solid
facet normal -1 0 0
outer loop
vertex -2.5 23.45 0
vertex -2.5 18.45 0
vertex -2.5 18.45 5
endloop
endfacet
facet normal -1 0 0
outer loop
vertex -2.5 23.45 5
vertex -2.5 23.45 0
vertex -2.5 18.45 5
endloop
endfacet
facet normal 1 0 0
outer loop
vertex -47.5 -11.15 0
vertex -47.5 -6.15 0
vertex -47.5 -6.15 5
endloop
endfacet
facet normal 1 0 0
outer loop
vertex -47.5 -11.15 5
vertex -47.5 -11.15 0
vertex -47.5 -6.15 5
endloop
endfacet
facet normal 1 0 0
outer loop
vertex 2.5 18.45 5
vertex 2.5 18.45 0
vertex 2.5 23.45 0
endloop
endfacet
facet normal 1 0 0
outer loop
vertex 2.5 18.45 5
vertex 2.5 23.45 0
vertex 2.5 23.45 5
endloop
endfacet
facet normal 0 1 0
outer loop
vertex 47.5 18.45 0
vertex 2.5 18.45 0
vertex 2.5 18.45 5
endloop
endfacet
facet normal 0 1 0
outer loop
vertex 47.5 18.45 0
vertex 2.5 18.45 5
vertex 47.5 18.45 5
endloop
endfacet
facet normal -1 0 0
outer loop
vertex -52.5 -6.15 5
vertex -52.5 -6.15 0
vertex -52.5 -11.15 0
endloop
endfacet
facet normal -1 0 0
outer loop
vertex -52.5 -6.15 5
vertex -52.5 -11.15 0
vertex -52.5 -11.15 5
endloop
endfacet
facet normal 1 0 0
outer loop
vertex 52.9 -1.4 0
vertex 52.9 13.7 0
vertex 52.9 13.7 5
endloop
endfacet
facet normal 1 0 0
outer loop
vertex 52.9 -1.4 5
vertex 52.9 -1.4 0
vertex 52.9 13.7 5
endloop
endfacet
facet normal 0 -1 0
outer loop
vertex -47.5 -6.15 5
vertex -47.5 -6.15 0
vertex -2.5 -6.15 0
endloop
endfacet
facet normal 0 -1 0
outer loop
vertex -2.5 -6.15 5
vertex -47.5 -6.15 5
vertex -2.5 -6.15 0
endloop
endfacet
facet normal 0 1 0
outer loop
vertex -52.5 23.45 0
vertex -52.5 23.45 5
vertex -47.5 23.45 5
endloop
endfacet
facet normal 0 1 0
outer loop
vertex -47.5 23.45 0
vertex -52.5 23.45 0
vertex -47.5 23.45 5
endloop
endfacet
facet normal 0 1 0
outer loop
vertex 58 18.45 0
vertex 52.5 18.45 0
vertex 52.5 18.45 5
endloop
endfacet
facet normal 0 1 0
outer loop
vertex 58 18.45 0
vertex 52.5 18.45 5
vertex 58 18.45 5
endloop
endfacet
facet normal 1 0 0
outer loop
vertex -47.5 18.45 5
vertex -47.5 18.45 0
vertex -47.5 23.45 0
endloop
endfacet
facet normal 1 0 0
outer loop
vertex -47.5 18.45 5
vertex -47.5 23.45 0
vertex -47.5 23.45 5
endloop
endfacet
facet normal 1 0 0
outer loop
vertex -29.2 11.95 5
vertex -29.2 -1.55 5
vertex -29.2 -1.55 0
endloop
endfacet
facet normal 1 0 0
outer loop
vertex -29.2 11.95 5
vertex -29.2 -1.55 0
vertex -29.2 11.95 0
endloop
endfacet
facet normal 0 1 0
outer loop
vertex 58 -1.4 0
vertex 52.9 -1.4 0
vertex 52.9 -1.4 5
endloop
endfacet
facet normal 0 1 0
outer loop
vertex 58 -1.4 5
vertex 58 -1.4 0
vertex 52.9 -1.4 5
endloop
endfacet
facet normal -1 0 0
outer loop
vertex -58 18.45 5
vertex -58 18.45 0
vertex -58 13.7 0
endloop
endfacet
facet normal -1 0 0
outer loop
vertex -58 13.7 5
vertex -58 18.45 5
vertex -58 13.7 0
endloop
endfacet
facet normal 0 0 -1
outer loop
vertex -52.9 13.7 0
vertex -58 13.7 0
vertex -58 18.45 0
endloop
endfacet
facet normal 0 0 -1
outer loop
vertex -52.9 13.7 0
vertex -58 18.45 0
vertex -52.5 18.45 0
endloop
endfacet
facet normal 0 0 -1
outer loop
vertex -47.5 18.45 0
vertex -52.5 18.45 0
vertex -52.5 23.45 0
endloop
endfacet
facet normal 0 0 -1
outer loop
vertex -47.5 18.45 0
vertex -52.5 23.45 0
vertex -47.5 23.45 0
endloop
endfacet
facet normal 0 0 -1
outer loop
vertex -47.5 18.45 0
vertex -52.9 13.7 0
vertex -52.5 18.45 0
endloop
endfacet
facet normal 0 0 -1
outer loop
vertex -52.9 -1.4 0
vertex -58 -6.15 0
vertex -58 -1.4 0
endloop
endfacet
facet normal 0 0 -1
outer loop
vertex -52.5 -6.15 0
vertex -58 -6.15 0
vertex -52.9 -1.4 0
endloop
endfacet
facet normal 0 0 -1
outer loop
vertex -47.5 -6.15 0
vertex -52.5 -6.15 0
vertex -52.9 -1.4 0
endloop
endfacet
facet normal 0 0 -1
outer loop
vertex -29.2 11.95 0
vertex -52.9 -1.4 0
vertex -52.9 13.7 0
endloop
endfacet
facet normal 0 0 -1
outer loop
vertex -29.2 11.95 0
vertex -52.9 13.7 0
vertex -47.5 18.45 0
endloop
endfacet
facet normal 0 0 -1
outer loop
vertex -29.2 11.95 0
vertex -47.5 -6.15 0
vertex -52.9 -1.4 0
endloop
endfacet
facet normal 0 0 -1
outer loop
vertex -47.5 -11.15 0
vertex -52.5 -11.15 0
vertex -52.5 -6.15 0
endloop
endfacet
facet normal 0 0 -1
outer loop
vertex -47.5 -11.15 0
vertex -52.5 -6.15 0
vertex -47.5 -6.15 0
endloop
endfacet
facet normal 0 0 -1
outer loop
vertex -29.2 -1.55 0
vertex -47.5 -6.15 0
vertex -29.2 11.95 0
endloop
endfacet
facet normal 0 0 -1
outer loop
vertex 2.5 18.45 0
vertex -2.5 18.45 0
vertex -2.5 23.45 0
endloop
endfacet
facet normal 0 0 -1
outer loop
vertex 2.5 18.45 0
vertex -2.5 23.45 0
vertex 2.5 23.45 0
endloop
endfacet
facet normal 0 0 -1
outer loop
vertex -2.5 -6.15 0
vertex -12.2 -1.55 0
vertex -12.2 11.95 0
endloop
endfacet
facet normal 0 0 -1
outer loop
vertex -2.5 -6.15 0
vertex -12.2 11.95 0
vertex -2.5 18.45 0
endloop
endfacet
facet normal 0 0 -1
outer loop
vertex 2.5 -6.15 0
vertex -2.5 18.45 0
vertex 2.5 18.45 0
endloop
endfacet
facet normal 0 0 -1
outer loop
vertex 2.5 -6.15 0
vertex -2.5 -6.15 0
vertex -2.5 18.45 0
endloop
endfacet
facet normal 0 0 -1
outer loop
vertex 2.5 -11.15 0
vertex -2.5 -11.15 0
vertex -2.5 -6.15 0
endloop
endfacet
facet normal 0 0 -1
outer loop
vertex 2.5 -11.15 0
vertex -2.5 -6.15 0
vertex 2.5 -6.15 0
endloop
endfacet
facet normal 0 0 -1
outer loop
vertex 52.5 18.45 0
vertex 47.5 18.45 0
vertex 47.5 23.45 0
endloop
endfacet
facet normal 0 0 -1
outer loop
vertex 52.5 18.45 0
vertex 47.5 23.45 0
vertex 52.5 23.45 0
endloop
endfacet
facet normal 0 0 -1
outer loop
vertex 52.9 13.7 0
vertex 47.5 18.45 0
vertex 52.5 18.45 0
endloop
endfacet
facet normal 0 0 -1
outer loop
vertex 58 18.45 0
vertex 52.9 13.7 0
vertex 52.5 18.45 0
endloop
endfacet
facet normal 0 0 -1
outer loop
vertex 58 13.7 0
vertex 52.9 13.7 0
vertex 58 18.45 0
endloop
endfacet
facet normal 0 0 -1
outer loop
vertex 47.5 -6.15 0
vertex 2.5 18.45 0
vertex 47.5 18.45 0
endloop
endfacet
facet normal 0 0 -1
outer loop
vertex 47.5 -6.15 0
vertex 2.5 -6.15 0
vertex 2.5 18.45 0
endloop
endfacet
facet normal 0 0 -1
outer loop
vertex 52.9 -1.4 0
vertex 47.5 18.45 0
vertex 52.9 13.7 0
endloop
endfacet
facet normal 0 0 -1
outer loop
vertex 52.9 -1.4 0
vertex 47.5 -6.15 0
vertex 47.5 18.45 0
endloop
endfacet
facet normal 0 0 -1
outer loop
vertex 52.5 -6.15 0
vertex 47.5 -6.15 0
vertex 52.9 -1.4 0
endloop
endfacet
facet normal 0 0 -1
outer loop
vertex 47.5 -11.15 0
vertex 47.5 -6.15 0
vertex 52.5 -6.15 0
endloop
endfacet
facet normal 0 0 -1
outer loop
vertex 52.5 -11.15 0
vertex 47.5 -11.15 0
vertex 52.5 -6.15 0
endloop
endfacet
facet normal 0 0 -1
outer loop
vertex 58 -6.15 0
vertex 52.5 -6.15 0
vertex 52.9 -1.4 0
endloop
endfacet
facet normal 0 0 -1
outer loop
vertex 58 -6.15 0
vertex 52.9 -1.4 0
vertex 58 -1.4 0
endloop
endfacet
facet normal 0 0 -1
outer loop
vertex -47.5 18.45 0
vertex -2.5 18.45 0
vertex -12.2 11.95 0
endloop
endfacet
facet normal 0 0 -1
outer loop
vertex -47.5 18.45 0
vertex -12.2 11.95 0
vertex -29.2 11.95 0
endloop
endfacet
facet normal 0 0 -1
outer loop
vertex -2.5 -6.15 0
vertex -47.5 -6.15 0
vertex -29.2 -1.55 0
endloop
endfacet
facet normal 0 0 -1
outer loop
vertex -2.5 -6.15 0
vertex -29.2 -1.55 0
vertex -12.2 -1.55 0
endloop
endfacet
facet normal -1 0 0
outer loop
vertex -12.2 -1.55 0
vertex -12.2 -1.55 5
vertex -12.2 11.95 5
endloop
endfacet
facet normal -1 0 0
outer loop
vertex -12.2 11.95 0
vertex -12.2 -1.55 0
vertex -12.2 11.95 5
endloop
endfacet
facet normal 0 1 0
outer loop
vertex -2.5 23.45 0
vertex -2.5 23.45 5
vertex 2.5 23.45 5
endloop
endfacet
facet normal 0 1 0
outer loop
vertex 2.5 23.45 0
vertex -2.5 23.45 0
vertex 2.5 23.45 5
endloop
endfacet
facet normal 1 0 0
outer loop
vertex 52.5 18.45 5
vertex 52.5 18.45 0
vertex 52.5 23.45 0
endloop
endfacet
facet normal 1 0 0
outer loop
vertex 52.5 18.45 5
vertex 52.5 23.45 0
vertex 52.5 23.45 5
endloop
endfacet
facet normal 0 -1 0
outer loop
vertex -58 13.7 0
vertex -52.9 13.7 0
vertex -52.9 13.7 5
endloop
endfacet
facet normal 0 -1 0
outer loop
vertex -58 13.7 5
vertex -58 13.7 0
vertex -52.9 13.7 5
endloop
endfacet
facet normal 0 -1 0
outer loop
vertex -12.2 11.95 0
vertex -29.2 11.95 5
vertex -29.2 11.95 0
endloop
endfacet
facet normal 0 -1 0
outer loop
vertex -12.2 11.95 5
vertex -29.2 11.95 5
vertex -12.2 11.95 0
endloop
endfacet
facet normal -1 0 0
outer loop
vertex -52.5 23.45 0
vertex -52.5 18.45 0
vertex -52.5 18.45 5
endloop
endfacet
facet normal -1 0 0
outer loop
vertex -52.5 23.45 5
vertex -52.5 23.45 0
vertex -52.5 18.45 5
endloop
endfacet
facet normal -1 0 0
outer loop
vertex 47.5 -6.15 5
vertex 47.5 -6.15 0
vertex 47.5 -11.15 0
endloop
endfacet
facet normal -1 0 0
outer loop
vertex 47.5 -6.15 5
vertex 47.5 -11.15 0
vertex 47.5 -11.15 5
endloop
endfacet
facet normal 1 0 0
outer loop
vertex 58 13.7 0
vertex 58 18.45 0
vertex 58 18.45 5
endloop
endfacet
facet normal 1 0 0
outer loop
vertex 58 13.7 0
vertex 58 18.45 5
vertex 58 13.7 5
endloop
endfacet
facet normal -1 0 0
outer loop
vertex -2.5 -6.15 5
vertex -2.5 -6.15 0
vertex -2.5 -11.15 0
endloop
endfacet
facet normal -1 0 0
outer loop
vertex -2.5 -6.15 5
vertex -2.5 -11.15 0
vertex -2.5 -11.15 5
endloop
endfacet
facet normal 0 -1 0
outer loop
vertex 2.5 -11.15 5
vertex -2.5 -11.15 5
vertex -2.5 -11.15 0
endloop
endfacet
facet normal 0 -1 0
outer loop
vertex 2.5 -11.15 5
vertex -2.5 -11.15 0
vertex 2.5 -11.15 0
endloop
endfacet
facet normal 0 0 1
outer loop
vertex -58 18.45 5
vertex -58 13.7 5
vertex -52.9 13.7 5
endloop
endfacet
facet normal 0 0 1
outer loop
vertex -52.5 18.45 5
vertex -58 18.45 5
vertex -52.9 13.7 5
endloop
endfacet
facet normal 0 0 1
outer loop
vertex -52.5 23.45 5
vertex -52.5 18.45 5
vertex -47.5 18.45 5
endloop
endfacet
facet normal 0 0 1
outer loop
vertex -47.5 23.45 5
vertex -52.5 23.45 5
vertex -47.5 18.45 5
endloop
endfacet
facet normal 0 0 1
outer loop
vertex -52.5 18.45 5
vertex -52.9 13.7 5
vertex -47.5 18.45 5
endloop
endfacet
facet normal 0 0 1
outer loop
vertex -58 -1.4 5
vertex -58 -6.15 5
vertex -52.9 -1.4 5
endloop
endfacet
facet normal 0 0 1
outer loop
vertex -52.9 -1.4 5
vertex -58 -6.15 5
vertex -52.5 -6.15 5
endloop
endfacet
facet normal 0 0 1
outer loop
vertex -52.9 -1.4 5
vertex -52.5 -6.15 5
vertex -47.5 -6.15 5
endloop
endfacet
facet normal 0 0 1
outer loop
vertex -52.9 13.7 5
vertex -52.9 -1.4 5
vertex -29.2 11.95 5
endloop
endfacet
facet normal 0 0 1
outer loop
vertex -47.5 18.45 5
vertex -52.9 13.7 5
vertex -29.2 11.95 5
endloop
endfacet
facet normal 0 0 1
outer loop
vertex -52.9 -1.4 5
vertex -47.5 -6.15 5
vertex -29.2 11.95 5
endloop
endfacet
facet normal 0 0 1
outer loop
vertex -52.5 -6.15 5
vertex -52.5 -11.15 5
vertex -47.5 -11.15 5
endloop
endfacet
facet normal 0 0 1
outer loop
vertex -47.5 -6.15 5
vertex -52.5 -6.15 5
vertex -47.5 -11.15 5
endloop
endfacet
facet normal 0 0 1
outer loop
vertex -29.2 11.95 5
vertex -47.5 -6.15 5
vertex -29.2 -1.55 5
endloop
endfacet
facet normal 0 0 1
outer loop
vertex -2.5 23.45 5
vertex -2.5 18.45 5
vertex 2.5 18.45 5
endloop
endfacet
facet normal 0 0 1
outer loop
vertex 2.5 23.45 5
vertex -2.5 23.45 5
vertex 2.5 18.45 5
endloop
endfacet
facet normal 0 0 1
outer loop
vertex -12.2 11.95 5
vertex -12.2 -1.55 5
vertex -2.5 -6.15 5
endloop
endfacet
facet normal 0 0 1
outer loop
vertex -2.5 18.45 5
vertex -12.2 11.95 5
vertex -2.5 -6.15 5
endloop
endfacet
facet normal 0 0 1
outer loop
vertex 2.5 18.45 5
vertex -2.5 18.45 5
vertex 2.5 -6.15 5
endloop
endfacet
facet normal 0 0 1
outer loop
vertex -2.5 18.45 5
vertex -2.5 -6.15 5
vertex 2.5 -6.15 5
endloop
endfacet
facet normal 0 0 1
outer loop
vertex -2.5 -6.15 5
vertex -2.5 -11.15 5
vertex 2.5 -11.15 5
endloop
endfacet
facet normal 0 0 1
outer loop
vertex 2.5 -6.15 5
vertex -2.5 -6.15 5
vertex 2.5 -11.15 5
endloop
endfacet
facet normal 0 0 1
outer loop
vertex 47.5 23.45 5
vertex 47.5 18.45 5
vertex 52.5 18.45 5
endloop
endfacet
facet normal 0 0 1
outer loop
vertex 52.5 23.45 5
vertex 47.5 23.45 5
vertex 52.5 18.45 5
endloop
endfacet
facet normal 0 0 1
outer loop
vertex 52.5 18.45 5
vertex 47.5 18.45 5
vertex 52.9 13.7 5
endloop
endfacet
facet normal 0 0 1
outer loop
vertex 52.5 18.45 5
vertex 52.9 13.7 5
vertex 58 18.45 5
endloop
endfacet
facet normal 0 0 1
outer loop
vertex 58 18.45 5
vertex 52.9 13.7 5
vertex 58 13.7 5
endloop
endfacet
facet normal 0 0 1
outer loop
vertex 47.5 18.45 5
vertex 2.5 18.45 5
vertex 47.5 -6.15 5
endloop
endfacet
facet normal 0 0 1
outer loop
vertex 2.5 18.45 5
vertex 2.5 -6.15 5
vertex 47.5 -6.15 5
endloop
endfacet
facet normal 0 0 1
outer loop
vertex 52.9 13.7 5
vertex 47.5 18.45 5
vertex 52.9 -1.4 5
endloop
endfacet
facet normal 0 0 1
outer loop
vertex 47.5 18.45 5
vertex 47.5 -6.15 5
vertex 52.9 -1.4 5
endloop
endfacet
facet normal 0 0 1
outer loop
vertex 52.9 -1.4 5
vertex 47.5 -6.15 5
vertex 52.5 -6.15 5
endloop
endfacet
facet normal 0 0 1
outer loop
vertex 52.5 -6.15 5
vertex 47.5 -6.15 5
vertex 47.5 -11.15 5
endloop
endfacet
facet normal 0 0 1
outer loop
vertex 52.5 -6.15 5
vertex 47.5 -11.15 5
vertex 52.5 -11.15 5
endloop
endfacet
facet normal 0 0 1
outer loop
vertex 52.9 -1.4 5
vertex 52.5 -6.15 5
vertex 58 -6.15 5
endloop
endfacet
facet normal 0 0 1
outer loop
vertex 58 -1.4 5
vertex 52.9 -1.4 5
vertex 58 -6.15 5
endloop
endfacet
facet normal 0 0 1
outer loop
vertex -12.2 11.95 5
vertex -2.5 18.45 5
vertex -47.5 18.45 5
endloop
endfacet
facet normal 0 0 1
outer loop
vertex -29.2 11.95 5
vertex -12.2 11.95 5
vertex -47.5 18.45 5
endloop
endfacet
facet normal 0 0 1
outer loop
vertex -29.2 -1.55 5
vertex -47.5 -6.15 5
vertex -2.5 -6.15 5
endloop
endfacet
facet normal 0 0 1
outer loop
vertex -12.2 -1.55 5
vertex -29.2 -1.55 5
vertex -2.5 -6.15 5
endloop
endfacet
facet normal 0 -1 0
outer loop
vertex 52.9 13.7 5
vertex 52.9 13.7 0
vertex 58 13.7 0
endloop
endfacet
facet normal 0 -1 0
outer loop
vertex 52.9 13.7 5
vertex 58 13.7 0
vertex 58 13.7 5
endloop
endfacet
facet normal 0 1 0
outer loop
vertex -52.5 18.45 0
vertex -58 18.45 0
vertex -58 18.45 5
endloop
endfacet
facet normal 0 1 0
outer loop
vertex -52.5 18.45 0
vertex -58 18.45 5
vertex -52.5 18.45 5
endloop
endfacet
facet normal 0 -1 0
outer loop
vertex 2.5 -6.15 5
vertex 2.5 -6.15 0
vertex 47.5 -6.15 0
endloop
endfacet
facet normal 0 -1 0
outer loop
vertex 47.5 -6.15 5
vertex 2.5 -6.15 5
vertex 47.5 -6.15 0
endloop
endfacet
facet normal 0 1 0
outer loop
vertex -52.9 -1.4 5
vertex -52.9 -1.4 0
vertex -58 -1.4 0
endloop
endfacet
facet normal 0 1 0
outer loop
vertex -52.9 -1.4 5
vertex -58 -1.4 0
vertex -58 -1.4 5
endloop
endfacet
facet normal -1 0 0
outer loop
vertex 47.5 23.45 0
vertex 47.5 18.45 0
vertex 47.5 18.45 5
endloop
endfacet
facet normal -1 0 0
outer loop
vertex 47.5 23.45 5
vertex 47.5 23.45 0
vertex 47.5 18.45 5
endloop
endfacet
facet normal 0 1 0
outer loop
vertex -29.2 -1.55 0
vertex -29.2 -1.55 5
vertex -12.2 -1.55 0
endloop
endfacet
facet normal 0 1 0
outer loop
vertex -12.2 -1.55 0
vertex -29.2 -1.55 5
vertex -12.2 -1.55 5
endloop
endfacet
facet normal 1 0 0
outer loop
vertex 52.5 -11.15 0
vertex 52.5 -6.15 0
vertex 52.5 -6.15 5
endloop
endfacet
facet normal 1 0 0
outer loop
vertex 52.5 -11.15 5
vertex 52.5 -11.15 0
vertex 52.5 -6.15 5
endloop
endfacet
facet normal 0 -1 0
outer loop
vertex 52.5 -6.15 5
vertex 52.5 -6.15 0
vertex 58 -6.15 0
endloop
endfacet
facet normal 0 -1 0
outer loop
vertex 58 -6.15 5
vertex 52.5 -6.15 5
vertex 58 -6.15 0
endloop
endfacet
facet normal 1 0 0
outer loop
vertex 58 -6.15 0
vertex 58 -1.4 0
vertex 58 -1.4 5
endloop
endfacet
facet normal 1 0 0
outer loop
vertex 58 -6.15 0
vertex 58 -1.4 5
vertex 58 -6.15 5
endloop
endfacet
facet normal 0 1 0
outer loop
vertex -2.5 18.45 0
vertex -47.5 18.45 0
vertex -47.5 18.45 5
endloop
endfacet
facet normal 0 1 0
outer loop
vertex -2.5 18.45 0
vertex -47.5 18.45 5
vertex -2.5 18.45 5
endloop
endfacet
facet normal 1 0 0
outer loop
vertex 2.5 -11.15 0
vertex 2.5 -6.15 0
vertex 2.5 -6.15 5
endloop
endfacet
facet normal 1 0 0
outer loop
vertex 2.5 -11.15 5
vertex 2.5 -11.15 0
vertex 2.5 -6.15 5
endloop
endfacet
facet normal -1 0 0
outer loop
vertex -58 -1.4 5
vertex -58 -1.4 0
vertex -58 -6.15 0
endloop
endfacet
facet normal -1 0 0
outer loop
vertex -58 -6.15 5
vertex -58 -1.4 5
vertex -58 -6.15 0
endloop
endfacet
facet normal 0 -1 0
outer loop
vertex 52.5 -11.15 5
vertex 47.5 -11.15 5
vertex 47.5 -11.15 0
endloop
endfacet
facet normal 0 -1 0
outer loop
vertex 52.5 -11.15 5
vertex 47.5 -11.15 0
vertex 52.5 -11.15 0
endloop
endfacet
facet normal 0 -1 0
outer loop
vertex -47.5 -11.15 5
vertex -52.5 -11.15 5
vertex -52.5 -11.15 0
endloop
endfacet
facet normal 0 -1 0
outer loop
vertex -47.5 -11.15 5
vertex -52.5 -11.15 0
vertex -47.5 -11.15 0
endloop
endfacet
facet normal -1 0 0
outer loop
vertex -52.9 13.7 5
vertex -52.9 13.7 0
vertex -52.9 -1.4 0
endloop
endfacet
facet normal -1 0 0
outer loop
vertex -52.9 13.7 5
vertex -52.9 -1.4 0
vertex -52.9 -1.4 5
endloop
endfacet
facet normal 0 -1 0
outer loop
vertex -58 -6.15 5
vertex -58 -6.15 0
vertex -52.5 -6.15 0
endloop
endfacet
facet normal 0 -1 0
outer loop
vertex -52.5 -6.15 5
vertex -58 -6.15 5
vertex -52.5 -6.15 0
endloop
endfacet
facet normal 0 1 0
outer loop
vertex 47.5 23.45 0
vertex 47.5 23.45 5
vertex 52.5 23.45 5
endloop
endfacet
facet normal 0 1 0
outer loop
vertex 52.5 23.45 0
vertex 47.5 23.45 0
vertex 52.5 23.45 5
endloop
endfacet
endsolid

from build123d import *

# Parameters (mm, degrees)
SKETCH1_W           = 116
SKETCH1_H           = 12.3
BOSS_EXTRUDE1_DEPTH = 5
SKETCH2_W           = 5
SKETCH2_H           = 5
BOSS_EXTRUDE2_DEPTH = 5
SKETCH3_W           = 17
SKETCH3_H           = 13.5
CUT_EXTRUDE1_DEPTH  = 6
SKETCH4_W           = 5
SKETCH4_H           = 15.1
CUT_EXTRUDE2_DEPTH  = 5.1


with BuildPart() as part:
    # Sketch1 → Boss-Extrude1 (new body)
    with BuildSketch(Plane.XY):
        Rectangle(SKETCH1_W, SKETCH1_H)
    extrude(amount=BOSS_EXTRUDE1_DEPTH)

    # Sketch2 → Boss-Extrude2 (add)
    with BuildSketch(Plane.XZ.offset(6.15)):
        with Locations((-50, 2.5)):
            Rectangle(SKETCH2_W, SKETCH2_H)
        with Locations((0, 2.5)):
            Rectangle(SKETCH2_W, SKETCH2_H)
        with Locations((50, 2.5)):
            Rectangle(SKETCH2_W, SKETCH2_H)
    extrude(amount=BOSS_EXTRUDE2_DEPTH)

    # Mirror1: part across plane


with BuildPart() as part_1:
    add(part.part)
    add(part.part.mirror(Plane(origin=(-58, 6.15, 5), x_dir=(0, 0, 1), z_dir=(0, -1, 0))))

    # Sketch3 → Cut-Extrude1 (cut, through all)
    with BuildSketch(Plane.XY.offset(5)):
        with Locations((-20.7, 5.2)):
            Rectangle(SKETCH3_W, SKETCH3_H)
    extrude(amount=-CUT_EXTRUDE1_DEPTH, mode=Mode.SUBTRACT)

    # Sketch4 → Cut-Extrude2 (cut)
    with BuildSketch(Plane.ZY.offset(58)):
        with Locations((2.5, 6.15)):
            Rectangle(SKETCH4_W, SKETCH4_H)
    cut_extrude2 = extrude(amount=-CUT_EXTRUDE2_DEPTH, mode=Mode.SUBTRACT)

    # Mirror2: Cut-Extrude2 across plane
    add(cut_extrude2.mirror(Plane(origin=(0, 0, 0), x_dir=(0, 0, 1), z_dir=(1, 0, 0))), mode=Mode.SUBTRACT)


solid = part_1.part
